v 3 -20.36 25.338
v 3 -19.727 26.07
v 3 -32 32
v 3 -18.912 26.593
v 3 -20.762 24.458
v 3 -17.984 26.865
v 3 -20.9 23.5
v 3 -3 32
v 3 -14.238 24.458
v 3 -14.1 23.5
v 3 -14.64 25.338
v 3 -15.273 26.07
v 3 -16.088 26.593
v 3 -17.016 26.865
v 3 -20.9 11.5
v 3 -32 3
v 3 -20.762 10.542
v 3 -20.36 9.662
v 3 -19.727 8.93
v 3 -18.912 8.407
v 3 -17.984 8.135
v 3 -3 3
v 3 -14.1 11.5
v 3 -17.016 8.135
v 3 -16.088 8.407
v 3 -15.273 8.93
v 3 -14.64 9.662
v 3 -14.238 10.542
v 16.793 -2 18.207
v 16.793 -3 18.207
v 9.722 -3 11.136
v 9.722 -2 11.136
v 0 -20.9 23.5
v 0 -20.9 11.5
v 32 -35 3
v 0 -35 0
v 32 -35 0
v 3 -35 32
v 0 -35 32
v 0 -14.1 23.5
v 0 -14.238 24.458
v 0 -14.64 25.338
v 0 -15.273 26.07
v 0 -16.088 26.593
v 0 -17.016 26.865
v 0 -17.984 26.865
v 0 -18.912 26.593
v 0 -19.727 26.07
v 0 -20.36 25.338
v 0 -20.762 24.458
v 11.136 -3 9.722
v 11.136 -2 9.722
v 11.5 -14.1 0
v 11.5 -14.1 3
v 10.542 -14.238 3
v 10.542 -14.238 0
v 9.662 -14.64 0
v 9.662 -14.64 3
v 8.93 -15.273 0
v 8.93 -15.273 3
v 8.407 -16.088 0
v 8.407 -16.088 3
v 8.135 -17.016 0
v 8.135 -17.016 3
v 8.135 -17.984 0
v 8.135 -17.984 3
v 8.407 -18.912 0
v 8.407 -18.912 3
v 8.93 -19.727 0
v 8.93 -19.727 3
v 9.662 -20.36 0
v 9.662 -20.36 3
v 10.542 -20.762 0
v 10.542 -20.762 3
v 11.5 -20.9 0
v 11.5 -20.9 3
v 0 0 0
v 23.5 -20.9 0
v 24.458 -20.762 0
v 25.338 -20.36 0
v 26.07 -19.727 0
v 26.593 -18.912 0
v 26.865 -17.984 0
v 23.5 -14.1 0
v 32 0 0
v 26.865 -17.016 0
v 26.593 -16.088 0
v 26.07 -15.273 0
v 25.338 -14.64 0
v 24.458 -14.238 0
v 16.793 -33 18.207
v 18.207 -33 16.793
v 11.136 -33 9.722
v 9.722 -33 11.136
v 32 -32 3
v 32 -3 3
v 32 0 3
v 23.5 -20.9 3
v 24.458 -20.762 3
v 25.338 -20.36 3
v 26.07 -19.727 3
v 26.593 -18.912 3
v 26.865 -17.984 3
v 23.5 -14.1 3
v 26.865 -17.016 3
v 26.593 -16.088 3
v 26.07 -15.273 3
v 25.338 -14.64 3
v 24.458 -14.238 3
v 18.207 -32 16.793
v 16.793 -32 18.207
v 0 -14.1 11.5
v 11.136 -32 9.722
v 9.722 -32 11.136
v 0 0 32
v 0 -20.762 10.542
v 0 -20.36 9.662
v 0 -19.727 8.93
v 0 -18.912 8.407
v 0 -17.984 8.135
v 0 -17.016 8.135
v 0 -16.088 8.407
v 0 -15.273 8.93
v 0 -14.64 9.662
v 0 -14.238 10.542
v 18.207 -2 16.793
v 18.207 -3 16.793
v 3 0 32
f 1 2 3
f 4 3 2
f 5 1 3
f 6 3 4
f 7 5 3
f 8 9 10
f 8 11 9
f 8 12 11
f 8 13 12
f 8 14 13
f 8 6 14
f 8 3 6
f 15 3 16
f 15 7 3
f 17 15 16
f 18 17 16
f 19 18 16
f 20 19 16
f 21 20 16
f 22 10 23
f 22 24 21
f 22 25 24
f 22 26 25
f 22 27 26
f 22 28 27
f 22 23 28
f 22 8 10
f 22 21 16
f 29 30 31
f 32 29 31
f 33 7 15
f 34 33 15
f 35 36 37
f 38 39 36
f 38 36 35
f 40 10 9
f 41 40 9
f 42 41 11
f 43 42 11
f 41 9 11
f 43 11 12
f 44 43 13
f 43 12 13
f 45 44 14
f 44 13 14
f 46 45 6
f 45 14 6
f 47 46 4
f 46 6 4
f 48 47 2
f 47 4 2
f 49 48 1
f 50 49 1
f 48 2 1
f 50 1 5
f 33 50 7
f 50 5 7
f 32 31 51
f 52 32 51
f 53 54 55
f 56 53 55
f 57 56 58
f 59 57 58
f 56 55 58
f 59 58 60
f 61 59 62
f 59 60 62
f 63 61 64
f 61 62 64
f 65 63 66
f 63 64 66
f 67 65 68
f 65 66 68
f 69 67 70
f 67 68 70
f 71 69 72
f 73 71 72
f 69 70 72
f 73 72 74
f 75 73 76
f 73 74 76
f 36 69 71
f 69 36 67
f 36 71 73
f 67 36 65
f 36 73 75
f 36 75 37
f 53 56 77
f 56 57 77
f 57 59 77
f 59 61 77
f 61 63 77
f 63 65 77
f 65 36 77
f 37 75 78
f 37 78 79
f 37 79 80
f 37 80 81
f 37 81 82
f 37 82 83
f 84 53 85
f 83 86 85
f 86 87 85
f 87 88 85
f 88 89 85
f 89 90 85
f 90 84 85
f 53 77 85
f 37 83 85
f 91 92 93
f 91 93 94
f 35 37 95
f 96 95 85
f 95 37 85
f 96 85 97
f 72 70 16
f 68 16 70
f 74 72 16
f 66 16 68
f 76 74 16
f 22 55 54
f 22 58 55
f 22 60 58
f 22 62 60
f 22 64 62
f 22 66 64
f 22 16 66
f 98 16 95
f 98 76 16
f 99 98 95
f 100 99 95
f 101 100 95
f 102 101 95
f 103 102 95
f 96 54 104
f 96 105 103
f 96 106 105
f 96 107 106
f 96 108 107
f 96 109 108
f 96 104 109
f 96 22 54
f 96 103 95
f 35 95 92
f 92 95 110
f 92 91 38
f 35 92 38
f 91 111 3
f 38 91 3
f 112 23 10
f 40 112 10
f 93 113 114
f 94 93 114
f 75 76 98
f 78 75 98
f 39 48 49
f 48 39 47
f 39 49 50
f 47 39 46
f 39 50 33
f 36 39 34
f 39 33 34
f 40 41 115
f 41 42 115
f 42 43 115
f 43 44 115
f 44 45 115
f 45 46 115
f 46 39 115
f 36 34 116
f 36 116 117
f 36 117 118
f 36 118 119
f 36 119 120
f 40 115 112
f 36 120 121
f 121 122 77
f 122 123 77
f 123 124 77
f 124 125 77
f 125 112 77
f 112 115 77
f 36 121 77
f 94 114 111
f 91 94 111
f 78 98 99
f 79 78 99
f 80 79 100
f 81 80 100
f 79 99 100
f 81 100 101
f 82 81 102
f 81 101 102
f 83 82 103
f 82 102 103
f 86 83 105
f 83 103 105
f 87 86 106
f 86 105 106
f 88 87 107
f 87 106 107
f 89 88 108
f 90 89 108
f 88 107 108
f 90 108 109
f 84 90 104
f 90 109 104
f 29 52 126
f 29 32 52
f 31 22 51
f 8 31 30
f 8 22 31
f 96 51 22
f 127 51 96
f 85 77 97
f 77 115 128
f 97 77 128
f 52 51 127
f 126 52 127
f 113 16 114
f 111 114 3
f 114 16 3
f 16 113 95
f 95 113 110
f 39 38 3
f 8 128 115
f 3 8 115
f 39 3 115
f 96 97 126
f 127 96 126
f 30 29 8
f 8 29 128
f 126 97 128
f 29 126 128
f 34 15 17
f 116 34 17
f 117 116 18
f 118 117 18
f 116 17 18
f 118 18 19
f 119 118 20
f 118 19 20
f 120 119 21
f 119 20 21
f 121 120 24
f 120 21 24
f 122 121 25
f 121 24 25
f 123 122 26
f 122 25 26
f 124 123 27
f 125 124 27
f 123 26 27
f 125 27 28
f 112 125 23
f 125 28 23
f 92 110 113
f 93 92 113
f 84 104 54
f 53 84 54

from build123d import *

# Parameters (mm, degrees)
F1_DEPTH  = 35
F2_T      = 3
F4_DEPTH  = 3
F6_DEPTH  = 3
F8_DEPTH  = 1
F10_DEPTH = 1


# Not quite as in the source:
# - a shell that OpenCascade refuses in one call is made with other operations: the cavity is built on its own and cut out


with BuildPart() as f1:
    # F0 (on Front) → F1 (new body)
    with BuildSketch(Plane.XZ):
        Polygon((0, 32), (0, 0), (32, 0), (32, 3), (3, 32), align=None)
    extrude(amount=F1_DEPTH)

    # F2: shell of thickness 3, made by hand


with BuildPart() as f2_core1:
    # F2_t2: copy of F1
    add(f1.part)

    # the walls: a layer under each face that stays
    f2_faces = [f2_core1.faces().sort_by_distance(p)[0] for p in [
        (0, -17.5, 16),
        (16, -17.5, 0),
        (16, 0, 16),
        (16, -35, 16),
    ]]
    thicken(f2_faces, amount=-F2_T, mode=Mode.SUBTRACT)


with BuildPart() as f1_1:
    add(f1.part)

    # what is left inside the walls is the cavity
    f2_cavity = [f2_core1.part.solids().sort_by_distance(p)[0] for p in [
        (17.478787, -22.333333, 17.478787),
    ]]
    add(f2_cavity, mode=Mode.SUBTRACT)

    # F3 (on face) → F4 (cut)
    with BuildSketch(Plane.XY.offset(3)):
        with BuildLine():
            Line((11.5, -20.9), (23.5, -20.9))
            ThreePointArc((23.5, -20.9), (26.9, -17.5), (23.5, -14.1))
            Line((23.5, -14.1), (11.5, -14.1))
            ThreePointArc((11.5, -14.1), (8.1, -17.5), (11.5, -20.9))
        make_face()
    extrude(amount=-F4_DEPTH, mode=Mode.SUBTRACT)

    # F5 (on face) → F6 (cut)
    with BuildSketch(Plane.YZ.offset(3)):
        with BuildLine():
            Line((-14.1, 11.5), (-14.1, 23.5))
            ThreePointArc((-14.1, 23.5), (-17.5, 26.9), (-20.9, 23.5))
            Line((-20.9, 23.5), (-20.9, 11.5))
            ThreePointArc((-20.9, 11.5), (-17.5, 8.1), (-14.1, 11.5))
        make_face()
    extrude(amount=-F6_DEPTH, mode=Mode.SUBTRACT)

    # F7 (on face) → F8 (cut)
    with BuildSketch(Plane.XZ.offset(3)):
        Polygon((11.1360389693, 9.7218254069), (18.2071067812, 16.7928932188), (16.7928932188, 18.2071067812), (9.7218254069, 11.1360389693), align=None)
    extrude(amount=-F8_DEPTH, mode=Mode.SUBTRACT)

    # F9 (on face) → F10 (cut)
    with BuildSketch(Plane(origin=(0, -32, 0), x_dir=(-1, 0, 0), z_dir=(0, 1, 0))):
        Polygon((-16.7928932188, 18.2071067812), (-18.2071067812, 16.7928932188), (-11.1360389693, 9.7218254069), (-9.7218254069, 11.1360389693), align=None)
    extrude(amount=-F10_DEPTH, mode=Mode.SUBTRACT)


solid = f1_1.part
